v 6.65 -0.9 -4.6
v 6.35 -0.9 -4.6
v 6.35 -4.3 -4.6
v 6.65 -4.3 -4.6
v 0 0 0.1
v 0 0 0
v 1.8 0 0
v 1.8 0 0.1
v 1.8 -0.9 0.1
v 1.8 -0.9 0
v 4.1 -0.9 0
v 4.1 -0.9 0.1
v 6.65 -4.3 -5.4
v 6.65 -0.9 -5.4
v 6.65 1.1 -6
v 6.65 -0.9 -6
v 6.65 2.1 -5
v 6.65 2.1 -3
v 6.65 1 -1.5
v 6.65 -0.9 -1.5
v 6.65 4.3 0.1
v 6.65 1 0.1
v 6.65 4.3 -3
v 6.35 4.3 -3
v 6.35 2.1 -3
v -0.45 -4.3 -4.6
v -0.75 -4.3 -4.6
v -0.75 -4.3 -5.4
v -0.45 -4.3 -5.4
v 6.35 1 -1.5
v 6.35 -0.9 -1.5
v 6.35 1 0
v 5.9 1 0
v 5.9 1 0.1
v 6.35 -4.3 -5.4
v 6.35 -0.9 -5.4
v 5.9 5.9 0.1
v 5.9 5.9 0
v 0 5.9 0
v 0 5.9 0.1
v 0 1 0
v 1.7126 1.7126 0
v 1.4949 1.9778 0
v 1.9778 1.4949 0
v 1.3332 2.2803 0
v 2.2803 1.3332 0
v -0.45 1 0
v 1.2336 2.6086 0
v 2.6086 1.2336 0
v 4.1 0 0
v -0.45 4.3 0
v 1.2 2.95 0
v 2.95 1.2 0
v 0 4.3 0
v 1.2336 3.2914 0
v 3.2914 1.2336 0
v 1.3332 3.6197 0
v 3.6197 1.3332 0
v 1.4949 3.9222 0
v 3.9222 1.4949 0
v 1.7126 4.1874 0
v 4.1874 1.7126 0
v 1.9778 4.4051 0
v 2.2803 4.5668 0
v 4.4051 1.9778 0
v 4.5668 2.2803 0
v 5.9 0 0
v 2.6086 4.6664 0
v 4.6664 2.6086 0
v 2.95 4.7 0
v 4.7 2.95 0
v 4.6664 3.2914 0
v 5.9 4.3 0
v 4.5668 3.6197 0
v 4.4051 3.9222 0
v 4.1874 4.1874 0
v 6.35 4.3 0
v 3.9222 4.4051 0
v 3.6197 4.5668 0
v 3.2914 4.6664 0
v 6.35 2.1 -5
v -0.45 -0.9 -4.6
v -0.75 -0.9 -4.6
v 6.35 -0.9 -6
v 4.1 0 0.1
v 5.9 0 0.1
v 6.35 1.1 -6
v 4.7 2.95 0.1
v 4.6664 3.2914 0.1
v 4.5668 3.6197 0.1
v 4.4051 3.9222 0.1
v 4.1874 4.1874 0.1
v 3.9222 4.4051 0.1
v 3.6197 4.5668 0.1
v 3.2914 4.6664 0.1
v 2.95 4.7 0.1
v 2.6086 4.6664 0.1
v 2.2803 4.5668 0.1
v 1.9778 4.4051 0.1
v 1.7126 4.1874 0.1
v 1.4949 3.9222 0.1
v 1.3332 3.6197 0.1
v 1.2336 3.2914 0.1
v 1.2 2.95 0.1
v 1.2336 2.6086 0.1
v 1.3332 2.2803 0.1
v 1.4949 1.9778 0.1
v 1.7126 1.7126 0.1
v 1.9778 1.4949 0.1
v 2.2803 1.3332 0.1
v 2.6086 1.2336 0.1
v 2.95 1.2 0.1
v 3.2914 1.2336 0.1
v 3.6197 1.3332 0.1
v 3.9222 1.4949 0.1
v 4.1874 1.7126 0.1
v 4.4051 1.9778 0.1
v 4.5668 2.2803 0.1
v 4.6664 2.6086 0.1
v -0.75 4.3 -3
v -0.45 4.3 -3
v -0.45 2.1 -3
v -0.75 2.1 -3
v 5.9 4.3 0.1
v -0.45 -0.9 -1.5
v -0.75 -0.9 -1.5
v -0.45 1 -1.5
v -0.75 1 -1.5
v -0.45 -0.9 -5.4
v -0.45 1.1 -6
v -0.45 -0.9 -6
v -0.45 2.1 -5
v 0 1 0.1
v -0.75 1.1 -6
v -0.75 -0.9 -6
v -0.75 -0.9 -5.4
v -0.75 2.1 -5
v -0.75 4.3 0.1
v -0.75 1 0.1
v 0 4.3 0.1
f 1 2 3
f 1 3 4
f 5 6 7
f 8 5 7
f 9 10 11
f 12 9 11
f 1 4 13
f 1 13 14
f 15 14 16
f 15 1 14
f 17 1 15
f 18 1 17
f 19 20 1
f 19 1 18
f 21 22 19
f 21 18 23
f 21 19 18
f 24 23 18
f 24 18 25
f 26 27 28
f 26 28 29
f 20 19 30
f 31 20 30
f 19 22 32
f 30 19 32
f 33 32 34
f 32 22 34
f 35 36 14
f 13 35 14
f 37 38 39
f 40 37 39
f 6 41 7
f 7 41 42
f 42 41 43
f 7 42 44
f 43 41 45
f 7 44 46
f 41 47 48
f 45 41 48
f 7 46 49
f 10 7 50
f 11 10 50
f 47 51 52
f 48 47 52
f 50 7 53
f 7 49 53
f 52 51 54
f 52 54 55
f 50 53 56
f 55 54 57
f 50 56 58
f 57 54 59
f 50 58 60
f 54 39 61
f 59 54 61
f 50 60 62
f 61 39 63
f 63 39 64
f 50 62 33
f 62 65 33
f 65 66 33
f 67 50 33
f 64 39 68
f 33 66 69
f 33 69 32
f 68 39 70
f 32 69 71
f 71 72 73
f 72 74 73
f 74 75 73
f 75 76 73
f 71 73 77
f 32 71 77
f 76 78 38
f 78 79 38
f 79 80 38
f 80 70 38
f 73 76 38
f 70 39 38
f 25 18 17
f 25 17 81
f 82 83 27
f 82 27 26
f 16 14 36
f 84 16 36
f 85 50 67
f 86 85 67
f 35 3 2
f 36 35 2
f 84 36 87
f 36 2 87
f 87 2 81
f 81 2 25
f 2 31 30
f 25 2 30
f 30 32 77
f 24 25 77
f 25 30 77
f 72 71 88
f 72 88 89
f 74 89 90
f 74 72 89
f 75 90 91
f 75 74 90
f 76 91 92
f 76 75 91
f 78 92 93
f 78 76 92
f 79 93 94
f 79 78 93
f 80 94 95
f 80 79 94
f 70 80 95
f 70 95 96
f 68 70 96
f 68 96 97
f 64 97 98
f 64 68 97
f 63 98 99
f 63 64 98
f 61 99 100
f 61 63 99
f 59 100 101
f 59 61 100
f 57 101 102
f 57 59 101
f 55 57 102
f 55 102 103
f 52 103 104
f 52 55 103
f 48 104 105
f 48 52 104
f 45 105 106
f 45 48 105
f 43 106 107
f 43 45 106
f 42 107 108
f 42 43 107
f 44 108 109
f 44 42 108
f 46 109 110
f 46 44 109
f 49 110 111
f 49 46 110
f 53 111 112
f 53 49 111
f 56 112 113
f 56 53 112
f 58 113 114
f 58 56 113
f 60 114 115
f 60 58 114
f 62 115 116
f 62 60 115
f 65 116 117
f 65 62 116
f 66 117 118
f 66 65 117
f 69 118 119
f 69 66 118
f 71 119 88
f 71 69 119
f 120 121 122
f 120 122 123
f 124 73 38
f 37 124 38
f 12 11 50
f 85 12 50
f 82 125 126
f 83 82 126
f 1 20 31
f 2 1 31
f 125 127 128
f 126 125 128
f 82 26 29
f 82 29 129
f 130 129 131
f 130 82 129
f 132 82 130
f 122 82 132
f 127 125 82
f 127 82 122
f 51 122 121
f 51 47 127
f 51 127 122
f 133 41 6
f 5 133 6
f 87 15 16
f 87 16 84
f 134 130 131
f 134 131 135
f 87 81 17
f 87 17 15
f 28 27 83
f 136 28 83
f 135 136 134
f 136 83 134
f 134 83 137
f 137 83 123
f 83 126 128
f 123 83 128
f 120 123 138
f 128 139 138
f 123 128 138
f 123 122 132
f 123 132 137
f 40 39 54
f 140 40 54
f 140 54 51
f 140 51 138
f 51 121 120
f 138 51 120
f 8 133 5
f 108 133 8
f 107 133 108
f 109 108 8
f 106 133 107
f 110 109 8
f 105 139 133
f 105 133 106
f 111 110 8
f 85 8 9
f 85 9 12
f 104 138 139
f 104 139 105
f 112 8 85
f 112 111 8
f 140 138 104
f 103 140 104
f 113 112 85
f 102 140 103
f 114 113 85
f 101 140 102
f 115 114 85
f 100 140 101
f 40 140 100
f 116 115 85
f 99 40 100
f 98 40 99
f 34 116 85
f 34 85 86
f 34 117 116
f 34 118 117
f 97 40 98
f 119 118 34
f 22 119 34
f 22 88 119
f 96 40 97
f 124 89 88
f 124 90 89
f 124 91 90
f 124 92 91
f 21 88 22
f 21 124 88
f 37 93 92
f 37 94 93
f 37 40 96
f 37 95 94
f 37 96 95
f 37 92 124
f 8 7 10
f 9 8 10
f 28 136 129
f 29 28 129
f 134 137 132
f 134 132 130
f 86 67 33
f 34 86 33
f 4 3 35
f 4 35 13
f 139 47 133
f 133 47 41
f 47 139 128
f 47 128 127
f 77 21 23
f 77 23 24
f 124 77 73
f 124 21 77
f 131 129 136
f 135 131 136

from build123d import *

# Parameters (mm, degrees)
SKETCH1_R                = 1.75
BOSS_EXTRUDE1_DEPTH      = 0.1
SKETCH2_W                = 0.3
SKETCH2_H                = 3.3
BOSS_EXTRUDE2_DEPTH      = 3
BOSS_EXTRUDE3_DEPTH      = 3
BOSS_EXTRUDE3_DEPTH_BACK = 1.5
SKETCH3_W                = 0.3
SKETCH3_H                = 3
CUT_EXTRUDE1_DEPTH       = 11.725320508
CUT_EXTRUDE1_DEPTH_BACK  = 11.725320508
SKETCH6_W                = 0.3
SKETCH6_H                = 0.8
BOSS_EXTRUDE4_DEPTH      = 3.4


with BuildPart() as part:
    # Sketch1 → Boss-Extrude1 (new body)
    with BuildSketch(Plane.XY):
        Polygon((1.8, 0), (1.8, -0.9), (4.1, -0.9), (4.1, 0), (5.9, 0), (5.9, 1), (6.65, 1), (6.65, 4.3), (5.9, 4.3), (5.9, 5.9), (0, 5.9), (0, 4.3), (-0.75, 4.3), (-0.75, 1), (0, 1), (0, 0), align=None)
        with Locations((2.95, 2.95)):
            Circle(SKETCH1_R, mode=Mode.SUBTRACT)
    extrude(amount=BOSS_EXTRUDE1_DEPTH)

    # Sketch2 → Boss-Extrude2 (add)
    with BuildSketch(Plane(origin=(0, 0, 0), x_dir=(-1, 0, 0), z_dir=(0, 0, -1))):
        with Locations((-6.5, 2.65)):
            Rectangle(SKETCH2_W, SKETCH2_H)
        with Locations((0.6, 2.65)):
            Rectangle(SKETCH2_W, SKETCH2_H)
    extrude(amount=BOSS_EXTRUDE2_DEPTH)

    # Sketch3 → Boss-Extrude3 (add, two sides: drawn at the far end of the back side and taken through both)
    with BuildSketch(Plane(origin=(0, 0, -3), x_dir=(-1, 0, 0), z_dir=(0, 0, -1)).offset(-BOSS_EXTRUDE3_DEPTH_BACK)):
        with Locations((0.6, 0.6)):
            Rectangle(SKETCH3_W, SKETCH3_H)
        with Locations((-6.5, 0.6)):
            Rectangle(SKETCH3_W, SKETCH3_H)
    extrude(amount=BOSS_EXTRUDE3_DEPTH + BOSS_EXTRUDE3_DEPTH_BACK)

    # Sketch5 → Cut-Extrude1 (cut, two sides: drawn at the far end of the back side and taken through both)
    with BuildSketch(Plane(origin=(0, 0, 0), x_dir=(0, 0, -1), z_dir=(1, 0, 0)).offset(-CUT_EXTRUDE1_DEPTH_BACK)):
        Polygon((5, 2.1), (6, 1.1), (6, 2.1), align=None)
    extrude(amount=CUT_EXTRUDE1_DEPTH + CUT_EXTRUDE1_DEPTH_BACK, mode=Mode.SUBTRACT)

    # Sketch6 → Boss-Extrude4 (add)
    with BuildSketch(Plane.XZ.offset(0.9)):
        with Locations((-0.6, -5)):
            Rectangle(SKETCH6_W, SKETCH6_H)
        with Locations((6.5, -5)):
            Rectangle(SKETCH6_W, SKETCH6_H)
    extrude(amount=BOSS_EXTRUDE4_DEPTH)


solid = part.part
